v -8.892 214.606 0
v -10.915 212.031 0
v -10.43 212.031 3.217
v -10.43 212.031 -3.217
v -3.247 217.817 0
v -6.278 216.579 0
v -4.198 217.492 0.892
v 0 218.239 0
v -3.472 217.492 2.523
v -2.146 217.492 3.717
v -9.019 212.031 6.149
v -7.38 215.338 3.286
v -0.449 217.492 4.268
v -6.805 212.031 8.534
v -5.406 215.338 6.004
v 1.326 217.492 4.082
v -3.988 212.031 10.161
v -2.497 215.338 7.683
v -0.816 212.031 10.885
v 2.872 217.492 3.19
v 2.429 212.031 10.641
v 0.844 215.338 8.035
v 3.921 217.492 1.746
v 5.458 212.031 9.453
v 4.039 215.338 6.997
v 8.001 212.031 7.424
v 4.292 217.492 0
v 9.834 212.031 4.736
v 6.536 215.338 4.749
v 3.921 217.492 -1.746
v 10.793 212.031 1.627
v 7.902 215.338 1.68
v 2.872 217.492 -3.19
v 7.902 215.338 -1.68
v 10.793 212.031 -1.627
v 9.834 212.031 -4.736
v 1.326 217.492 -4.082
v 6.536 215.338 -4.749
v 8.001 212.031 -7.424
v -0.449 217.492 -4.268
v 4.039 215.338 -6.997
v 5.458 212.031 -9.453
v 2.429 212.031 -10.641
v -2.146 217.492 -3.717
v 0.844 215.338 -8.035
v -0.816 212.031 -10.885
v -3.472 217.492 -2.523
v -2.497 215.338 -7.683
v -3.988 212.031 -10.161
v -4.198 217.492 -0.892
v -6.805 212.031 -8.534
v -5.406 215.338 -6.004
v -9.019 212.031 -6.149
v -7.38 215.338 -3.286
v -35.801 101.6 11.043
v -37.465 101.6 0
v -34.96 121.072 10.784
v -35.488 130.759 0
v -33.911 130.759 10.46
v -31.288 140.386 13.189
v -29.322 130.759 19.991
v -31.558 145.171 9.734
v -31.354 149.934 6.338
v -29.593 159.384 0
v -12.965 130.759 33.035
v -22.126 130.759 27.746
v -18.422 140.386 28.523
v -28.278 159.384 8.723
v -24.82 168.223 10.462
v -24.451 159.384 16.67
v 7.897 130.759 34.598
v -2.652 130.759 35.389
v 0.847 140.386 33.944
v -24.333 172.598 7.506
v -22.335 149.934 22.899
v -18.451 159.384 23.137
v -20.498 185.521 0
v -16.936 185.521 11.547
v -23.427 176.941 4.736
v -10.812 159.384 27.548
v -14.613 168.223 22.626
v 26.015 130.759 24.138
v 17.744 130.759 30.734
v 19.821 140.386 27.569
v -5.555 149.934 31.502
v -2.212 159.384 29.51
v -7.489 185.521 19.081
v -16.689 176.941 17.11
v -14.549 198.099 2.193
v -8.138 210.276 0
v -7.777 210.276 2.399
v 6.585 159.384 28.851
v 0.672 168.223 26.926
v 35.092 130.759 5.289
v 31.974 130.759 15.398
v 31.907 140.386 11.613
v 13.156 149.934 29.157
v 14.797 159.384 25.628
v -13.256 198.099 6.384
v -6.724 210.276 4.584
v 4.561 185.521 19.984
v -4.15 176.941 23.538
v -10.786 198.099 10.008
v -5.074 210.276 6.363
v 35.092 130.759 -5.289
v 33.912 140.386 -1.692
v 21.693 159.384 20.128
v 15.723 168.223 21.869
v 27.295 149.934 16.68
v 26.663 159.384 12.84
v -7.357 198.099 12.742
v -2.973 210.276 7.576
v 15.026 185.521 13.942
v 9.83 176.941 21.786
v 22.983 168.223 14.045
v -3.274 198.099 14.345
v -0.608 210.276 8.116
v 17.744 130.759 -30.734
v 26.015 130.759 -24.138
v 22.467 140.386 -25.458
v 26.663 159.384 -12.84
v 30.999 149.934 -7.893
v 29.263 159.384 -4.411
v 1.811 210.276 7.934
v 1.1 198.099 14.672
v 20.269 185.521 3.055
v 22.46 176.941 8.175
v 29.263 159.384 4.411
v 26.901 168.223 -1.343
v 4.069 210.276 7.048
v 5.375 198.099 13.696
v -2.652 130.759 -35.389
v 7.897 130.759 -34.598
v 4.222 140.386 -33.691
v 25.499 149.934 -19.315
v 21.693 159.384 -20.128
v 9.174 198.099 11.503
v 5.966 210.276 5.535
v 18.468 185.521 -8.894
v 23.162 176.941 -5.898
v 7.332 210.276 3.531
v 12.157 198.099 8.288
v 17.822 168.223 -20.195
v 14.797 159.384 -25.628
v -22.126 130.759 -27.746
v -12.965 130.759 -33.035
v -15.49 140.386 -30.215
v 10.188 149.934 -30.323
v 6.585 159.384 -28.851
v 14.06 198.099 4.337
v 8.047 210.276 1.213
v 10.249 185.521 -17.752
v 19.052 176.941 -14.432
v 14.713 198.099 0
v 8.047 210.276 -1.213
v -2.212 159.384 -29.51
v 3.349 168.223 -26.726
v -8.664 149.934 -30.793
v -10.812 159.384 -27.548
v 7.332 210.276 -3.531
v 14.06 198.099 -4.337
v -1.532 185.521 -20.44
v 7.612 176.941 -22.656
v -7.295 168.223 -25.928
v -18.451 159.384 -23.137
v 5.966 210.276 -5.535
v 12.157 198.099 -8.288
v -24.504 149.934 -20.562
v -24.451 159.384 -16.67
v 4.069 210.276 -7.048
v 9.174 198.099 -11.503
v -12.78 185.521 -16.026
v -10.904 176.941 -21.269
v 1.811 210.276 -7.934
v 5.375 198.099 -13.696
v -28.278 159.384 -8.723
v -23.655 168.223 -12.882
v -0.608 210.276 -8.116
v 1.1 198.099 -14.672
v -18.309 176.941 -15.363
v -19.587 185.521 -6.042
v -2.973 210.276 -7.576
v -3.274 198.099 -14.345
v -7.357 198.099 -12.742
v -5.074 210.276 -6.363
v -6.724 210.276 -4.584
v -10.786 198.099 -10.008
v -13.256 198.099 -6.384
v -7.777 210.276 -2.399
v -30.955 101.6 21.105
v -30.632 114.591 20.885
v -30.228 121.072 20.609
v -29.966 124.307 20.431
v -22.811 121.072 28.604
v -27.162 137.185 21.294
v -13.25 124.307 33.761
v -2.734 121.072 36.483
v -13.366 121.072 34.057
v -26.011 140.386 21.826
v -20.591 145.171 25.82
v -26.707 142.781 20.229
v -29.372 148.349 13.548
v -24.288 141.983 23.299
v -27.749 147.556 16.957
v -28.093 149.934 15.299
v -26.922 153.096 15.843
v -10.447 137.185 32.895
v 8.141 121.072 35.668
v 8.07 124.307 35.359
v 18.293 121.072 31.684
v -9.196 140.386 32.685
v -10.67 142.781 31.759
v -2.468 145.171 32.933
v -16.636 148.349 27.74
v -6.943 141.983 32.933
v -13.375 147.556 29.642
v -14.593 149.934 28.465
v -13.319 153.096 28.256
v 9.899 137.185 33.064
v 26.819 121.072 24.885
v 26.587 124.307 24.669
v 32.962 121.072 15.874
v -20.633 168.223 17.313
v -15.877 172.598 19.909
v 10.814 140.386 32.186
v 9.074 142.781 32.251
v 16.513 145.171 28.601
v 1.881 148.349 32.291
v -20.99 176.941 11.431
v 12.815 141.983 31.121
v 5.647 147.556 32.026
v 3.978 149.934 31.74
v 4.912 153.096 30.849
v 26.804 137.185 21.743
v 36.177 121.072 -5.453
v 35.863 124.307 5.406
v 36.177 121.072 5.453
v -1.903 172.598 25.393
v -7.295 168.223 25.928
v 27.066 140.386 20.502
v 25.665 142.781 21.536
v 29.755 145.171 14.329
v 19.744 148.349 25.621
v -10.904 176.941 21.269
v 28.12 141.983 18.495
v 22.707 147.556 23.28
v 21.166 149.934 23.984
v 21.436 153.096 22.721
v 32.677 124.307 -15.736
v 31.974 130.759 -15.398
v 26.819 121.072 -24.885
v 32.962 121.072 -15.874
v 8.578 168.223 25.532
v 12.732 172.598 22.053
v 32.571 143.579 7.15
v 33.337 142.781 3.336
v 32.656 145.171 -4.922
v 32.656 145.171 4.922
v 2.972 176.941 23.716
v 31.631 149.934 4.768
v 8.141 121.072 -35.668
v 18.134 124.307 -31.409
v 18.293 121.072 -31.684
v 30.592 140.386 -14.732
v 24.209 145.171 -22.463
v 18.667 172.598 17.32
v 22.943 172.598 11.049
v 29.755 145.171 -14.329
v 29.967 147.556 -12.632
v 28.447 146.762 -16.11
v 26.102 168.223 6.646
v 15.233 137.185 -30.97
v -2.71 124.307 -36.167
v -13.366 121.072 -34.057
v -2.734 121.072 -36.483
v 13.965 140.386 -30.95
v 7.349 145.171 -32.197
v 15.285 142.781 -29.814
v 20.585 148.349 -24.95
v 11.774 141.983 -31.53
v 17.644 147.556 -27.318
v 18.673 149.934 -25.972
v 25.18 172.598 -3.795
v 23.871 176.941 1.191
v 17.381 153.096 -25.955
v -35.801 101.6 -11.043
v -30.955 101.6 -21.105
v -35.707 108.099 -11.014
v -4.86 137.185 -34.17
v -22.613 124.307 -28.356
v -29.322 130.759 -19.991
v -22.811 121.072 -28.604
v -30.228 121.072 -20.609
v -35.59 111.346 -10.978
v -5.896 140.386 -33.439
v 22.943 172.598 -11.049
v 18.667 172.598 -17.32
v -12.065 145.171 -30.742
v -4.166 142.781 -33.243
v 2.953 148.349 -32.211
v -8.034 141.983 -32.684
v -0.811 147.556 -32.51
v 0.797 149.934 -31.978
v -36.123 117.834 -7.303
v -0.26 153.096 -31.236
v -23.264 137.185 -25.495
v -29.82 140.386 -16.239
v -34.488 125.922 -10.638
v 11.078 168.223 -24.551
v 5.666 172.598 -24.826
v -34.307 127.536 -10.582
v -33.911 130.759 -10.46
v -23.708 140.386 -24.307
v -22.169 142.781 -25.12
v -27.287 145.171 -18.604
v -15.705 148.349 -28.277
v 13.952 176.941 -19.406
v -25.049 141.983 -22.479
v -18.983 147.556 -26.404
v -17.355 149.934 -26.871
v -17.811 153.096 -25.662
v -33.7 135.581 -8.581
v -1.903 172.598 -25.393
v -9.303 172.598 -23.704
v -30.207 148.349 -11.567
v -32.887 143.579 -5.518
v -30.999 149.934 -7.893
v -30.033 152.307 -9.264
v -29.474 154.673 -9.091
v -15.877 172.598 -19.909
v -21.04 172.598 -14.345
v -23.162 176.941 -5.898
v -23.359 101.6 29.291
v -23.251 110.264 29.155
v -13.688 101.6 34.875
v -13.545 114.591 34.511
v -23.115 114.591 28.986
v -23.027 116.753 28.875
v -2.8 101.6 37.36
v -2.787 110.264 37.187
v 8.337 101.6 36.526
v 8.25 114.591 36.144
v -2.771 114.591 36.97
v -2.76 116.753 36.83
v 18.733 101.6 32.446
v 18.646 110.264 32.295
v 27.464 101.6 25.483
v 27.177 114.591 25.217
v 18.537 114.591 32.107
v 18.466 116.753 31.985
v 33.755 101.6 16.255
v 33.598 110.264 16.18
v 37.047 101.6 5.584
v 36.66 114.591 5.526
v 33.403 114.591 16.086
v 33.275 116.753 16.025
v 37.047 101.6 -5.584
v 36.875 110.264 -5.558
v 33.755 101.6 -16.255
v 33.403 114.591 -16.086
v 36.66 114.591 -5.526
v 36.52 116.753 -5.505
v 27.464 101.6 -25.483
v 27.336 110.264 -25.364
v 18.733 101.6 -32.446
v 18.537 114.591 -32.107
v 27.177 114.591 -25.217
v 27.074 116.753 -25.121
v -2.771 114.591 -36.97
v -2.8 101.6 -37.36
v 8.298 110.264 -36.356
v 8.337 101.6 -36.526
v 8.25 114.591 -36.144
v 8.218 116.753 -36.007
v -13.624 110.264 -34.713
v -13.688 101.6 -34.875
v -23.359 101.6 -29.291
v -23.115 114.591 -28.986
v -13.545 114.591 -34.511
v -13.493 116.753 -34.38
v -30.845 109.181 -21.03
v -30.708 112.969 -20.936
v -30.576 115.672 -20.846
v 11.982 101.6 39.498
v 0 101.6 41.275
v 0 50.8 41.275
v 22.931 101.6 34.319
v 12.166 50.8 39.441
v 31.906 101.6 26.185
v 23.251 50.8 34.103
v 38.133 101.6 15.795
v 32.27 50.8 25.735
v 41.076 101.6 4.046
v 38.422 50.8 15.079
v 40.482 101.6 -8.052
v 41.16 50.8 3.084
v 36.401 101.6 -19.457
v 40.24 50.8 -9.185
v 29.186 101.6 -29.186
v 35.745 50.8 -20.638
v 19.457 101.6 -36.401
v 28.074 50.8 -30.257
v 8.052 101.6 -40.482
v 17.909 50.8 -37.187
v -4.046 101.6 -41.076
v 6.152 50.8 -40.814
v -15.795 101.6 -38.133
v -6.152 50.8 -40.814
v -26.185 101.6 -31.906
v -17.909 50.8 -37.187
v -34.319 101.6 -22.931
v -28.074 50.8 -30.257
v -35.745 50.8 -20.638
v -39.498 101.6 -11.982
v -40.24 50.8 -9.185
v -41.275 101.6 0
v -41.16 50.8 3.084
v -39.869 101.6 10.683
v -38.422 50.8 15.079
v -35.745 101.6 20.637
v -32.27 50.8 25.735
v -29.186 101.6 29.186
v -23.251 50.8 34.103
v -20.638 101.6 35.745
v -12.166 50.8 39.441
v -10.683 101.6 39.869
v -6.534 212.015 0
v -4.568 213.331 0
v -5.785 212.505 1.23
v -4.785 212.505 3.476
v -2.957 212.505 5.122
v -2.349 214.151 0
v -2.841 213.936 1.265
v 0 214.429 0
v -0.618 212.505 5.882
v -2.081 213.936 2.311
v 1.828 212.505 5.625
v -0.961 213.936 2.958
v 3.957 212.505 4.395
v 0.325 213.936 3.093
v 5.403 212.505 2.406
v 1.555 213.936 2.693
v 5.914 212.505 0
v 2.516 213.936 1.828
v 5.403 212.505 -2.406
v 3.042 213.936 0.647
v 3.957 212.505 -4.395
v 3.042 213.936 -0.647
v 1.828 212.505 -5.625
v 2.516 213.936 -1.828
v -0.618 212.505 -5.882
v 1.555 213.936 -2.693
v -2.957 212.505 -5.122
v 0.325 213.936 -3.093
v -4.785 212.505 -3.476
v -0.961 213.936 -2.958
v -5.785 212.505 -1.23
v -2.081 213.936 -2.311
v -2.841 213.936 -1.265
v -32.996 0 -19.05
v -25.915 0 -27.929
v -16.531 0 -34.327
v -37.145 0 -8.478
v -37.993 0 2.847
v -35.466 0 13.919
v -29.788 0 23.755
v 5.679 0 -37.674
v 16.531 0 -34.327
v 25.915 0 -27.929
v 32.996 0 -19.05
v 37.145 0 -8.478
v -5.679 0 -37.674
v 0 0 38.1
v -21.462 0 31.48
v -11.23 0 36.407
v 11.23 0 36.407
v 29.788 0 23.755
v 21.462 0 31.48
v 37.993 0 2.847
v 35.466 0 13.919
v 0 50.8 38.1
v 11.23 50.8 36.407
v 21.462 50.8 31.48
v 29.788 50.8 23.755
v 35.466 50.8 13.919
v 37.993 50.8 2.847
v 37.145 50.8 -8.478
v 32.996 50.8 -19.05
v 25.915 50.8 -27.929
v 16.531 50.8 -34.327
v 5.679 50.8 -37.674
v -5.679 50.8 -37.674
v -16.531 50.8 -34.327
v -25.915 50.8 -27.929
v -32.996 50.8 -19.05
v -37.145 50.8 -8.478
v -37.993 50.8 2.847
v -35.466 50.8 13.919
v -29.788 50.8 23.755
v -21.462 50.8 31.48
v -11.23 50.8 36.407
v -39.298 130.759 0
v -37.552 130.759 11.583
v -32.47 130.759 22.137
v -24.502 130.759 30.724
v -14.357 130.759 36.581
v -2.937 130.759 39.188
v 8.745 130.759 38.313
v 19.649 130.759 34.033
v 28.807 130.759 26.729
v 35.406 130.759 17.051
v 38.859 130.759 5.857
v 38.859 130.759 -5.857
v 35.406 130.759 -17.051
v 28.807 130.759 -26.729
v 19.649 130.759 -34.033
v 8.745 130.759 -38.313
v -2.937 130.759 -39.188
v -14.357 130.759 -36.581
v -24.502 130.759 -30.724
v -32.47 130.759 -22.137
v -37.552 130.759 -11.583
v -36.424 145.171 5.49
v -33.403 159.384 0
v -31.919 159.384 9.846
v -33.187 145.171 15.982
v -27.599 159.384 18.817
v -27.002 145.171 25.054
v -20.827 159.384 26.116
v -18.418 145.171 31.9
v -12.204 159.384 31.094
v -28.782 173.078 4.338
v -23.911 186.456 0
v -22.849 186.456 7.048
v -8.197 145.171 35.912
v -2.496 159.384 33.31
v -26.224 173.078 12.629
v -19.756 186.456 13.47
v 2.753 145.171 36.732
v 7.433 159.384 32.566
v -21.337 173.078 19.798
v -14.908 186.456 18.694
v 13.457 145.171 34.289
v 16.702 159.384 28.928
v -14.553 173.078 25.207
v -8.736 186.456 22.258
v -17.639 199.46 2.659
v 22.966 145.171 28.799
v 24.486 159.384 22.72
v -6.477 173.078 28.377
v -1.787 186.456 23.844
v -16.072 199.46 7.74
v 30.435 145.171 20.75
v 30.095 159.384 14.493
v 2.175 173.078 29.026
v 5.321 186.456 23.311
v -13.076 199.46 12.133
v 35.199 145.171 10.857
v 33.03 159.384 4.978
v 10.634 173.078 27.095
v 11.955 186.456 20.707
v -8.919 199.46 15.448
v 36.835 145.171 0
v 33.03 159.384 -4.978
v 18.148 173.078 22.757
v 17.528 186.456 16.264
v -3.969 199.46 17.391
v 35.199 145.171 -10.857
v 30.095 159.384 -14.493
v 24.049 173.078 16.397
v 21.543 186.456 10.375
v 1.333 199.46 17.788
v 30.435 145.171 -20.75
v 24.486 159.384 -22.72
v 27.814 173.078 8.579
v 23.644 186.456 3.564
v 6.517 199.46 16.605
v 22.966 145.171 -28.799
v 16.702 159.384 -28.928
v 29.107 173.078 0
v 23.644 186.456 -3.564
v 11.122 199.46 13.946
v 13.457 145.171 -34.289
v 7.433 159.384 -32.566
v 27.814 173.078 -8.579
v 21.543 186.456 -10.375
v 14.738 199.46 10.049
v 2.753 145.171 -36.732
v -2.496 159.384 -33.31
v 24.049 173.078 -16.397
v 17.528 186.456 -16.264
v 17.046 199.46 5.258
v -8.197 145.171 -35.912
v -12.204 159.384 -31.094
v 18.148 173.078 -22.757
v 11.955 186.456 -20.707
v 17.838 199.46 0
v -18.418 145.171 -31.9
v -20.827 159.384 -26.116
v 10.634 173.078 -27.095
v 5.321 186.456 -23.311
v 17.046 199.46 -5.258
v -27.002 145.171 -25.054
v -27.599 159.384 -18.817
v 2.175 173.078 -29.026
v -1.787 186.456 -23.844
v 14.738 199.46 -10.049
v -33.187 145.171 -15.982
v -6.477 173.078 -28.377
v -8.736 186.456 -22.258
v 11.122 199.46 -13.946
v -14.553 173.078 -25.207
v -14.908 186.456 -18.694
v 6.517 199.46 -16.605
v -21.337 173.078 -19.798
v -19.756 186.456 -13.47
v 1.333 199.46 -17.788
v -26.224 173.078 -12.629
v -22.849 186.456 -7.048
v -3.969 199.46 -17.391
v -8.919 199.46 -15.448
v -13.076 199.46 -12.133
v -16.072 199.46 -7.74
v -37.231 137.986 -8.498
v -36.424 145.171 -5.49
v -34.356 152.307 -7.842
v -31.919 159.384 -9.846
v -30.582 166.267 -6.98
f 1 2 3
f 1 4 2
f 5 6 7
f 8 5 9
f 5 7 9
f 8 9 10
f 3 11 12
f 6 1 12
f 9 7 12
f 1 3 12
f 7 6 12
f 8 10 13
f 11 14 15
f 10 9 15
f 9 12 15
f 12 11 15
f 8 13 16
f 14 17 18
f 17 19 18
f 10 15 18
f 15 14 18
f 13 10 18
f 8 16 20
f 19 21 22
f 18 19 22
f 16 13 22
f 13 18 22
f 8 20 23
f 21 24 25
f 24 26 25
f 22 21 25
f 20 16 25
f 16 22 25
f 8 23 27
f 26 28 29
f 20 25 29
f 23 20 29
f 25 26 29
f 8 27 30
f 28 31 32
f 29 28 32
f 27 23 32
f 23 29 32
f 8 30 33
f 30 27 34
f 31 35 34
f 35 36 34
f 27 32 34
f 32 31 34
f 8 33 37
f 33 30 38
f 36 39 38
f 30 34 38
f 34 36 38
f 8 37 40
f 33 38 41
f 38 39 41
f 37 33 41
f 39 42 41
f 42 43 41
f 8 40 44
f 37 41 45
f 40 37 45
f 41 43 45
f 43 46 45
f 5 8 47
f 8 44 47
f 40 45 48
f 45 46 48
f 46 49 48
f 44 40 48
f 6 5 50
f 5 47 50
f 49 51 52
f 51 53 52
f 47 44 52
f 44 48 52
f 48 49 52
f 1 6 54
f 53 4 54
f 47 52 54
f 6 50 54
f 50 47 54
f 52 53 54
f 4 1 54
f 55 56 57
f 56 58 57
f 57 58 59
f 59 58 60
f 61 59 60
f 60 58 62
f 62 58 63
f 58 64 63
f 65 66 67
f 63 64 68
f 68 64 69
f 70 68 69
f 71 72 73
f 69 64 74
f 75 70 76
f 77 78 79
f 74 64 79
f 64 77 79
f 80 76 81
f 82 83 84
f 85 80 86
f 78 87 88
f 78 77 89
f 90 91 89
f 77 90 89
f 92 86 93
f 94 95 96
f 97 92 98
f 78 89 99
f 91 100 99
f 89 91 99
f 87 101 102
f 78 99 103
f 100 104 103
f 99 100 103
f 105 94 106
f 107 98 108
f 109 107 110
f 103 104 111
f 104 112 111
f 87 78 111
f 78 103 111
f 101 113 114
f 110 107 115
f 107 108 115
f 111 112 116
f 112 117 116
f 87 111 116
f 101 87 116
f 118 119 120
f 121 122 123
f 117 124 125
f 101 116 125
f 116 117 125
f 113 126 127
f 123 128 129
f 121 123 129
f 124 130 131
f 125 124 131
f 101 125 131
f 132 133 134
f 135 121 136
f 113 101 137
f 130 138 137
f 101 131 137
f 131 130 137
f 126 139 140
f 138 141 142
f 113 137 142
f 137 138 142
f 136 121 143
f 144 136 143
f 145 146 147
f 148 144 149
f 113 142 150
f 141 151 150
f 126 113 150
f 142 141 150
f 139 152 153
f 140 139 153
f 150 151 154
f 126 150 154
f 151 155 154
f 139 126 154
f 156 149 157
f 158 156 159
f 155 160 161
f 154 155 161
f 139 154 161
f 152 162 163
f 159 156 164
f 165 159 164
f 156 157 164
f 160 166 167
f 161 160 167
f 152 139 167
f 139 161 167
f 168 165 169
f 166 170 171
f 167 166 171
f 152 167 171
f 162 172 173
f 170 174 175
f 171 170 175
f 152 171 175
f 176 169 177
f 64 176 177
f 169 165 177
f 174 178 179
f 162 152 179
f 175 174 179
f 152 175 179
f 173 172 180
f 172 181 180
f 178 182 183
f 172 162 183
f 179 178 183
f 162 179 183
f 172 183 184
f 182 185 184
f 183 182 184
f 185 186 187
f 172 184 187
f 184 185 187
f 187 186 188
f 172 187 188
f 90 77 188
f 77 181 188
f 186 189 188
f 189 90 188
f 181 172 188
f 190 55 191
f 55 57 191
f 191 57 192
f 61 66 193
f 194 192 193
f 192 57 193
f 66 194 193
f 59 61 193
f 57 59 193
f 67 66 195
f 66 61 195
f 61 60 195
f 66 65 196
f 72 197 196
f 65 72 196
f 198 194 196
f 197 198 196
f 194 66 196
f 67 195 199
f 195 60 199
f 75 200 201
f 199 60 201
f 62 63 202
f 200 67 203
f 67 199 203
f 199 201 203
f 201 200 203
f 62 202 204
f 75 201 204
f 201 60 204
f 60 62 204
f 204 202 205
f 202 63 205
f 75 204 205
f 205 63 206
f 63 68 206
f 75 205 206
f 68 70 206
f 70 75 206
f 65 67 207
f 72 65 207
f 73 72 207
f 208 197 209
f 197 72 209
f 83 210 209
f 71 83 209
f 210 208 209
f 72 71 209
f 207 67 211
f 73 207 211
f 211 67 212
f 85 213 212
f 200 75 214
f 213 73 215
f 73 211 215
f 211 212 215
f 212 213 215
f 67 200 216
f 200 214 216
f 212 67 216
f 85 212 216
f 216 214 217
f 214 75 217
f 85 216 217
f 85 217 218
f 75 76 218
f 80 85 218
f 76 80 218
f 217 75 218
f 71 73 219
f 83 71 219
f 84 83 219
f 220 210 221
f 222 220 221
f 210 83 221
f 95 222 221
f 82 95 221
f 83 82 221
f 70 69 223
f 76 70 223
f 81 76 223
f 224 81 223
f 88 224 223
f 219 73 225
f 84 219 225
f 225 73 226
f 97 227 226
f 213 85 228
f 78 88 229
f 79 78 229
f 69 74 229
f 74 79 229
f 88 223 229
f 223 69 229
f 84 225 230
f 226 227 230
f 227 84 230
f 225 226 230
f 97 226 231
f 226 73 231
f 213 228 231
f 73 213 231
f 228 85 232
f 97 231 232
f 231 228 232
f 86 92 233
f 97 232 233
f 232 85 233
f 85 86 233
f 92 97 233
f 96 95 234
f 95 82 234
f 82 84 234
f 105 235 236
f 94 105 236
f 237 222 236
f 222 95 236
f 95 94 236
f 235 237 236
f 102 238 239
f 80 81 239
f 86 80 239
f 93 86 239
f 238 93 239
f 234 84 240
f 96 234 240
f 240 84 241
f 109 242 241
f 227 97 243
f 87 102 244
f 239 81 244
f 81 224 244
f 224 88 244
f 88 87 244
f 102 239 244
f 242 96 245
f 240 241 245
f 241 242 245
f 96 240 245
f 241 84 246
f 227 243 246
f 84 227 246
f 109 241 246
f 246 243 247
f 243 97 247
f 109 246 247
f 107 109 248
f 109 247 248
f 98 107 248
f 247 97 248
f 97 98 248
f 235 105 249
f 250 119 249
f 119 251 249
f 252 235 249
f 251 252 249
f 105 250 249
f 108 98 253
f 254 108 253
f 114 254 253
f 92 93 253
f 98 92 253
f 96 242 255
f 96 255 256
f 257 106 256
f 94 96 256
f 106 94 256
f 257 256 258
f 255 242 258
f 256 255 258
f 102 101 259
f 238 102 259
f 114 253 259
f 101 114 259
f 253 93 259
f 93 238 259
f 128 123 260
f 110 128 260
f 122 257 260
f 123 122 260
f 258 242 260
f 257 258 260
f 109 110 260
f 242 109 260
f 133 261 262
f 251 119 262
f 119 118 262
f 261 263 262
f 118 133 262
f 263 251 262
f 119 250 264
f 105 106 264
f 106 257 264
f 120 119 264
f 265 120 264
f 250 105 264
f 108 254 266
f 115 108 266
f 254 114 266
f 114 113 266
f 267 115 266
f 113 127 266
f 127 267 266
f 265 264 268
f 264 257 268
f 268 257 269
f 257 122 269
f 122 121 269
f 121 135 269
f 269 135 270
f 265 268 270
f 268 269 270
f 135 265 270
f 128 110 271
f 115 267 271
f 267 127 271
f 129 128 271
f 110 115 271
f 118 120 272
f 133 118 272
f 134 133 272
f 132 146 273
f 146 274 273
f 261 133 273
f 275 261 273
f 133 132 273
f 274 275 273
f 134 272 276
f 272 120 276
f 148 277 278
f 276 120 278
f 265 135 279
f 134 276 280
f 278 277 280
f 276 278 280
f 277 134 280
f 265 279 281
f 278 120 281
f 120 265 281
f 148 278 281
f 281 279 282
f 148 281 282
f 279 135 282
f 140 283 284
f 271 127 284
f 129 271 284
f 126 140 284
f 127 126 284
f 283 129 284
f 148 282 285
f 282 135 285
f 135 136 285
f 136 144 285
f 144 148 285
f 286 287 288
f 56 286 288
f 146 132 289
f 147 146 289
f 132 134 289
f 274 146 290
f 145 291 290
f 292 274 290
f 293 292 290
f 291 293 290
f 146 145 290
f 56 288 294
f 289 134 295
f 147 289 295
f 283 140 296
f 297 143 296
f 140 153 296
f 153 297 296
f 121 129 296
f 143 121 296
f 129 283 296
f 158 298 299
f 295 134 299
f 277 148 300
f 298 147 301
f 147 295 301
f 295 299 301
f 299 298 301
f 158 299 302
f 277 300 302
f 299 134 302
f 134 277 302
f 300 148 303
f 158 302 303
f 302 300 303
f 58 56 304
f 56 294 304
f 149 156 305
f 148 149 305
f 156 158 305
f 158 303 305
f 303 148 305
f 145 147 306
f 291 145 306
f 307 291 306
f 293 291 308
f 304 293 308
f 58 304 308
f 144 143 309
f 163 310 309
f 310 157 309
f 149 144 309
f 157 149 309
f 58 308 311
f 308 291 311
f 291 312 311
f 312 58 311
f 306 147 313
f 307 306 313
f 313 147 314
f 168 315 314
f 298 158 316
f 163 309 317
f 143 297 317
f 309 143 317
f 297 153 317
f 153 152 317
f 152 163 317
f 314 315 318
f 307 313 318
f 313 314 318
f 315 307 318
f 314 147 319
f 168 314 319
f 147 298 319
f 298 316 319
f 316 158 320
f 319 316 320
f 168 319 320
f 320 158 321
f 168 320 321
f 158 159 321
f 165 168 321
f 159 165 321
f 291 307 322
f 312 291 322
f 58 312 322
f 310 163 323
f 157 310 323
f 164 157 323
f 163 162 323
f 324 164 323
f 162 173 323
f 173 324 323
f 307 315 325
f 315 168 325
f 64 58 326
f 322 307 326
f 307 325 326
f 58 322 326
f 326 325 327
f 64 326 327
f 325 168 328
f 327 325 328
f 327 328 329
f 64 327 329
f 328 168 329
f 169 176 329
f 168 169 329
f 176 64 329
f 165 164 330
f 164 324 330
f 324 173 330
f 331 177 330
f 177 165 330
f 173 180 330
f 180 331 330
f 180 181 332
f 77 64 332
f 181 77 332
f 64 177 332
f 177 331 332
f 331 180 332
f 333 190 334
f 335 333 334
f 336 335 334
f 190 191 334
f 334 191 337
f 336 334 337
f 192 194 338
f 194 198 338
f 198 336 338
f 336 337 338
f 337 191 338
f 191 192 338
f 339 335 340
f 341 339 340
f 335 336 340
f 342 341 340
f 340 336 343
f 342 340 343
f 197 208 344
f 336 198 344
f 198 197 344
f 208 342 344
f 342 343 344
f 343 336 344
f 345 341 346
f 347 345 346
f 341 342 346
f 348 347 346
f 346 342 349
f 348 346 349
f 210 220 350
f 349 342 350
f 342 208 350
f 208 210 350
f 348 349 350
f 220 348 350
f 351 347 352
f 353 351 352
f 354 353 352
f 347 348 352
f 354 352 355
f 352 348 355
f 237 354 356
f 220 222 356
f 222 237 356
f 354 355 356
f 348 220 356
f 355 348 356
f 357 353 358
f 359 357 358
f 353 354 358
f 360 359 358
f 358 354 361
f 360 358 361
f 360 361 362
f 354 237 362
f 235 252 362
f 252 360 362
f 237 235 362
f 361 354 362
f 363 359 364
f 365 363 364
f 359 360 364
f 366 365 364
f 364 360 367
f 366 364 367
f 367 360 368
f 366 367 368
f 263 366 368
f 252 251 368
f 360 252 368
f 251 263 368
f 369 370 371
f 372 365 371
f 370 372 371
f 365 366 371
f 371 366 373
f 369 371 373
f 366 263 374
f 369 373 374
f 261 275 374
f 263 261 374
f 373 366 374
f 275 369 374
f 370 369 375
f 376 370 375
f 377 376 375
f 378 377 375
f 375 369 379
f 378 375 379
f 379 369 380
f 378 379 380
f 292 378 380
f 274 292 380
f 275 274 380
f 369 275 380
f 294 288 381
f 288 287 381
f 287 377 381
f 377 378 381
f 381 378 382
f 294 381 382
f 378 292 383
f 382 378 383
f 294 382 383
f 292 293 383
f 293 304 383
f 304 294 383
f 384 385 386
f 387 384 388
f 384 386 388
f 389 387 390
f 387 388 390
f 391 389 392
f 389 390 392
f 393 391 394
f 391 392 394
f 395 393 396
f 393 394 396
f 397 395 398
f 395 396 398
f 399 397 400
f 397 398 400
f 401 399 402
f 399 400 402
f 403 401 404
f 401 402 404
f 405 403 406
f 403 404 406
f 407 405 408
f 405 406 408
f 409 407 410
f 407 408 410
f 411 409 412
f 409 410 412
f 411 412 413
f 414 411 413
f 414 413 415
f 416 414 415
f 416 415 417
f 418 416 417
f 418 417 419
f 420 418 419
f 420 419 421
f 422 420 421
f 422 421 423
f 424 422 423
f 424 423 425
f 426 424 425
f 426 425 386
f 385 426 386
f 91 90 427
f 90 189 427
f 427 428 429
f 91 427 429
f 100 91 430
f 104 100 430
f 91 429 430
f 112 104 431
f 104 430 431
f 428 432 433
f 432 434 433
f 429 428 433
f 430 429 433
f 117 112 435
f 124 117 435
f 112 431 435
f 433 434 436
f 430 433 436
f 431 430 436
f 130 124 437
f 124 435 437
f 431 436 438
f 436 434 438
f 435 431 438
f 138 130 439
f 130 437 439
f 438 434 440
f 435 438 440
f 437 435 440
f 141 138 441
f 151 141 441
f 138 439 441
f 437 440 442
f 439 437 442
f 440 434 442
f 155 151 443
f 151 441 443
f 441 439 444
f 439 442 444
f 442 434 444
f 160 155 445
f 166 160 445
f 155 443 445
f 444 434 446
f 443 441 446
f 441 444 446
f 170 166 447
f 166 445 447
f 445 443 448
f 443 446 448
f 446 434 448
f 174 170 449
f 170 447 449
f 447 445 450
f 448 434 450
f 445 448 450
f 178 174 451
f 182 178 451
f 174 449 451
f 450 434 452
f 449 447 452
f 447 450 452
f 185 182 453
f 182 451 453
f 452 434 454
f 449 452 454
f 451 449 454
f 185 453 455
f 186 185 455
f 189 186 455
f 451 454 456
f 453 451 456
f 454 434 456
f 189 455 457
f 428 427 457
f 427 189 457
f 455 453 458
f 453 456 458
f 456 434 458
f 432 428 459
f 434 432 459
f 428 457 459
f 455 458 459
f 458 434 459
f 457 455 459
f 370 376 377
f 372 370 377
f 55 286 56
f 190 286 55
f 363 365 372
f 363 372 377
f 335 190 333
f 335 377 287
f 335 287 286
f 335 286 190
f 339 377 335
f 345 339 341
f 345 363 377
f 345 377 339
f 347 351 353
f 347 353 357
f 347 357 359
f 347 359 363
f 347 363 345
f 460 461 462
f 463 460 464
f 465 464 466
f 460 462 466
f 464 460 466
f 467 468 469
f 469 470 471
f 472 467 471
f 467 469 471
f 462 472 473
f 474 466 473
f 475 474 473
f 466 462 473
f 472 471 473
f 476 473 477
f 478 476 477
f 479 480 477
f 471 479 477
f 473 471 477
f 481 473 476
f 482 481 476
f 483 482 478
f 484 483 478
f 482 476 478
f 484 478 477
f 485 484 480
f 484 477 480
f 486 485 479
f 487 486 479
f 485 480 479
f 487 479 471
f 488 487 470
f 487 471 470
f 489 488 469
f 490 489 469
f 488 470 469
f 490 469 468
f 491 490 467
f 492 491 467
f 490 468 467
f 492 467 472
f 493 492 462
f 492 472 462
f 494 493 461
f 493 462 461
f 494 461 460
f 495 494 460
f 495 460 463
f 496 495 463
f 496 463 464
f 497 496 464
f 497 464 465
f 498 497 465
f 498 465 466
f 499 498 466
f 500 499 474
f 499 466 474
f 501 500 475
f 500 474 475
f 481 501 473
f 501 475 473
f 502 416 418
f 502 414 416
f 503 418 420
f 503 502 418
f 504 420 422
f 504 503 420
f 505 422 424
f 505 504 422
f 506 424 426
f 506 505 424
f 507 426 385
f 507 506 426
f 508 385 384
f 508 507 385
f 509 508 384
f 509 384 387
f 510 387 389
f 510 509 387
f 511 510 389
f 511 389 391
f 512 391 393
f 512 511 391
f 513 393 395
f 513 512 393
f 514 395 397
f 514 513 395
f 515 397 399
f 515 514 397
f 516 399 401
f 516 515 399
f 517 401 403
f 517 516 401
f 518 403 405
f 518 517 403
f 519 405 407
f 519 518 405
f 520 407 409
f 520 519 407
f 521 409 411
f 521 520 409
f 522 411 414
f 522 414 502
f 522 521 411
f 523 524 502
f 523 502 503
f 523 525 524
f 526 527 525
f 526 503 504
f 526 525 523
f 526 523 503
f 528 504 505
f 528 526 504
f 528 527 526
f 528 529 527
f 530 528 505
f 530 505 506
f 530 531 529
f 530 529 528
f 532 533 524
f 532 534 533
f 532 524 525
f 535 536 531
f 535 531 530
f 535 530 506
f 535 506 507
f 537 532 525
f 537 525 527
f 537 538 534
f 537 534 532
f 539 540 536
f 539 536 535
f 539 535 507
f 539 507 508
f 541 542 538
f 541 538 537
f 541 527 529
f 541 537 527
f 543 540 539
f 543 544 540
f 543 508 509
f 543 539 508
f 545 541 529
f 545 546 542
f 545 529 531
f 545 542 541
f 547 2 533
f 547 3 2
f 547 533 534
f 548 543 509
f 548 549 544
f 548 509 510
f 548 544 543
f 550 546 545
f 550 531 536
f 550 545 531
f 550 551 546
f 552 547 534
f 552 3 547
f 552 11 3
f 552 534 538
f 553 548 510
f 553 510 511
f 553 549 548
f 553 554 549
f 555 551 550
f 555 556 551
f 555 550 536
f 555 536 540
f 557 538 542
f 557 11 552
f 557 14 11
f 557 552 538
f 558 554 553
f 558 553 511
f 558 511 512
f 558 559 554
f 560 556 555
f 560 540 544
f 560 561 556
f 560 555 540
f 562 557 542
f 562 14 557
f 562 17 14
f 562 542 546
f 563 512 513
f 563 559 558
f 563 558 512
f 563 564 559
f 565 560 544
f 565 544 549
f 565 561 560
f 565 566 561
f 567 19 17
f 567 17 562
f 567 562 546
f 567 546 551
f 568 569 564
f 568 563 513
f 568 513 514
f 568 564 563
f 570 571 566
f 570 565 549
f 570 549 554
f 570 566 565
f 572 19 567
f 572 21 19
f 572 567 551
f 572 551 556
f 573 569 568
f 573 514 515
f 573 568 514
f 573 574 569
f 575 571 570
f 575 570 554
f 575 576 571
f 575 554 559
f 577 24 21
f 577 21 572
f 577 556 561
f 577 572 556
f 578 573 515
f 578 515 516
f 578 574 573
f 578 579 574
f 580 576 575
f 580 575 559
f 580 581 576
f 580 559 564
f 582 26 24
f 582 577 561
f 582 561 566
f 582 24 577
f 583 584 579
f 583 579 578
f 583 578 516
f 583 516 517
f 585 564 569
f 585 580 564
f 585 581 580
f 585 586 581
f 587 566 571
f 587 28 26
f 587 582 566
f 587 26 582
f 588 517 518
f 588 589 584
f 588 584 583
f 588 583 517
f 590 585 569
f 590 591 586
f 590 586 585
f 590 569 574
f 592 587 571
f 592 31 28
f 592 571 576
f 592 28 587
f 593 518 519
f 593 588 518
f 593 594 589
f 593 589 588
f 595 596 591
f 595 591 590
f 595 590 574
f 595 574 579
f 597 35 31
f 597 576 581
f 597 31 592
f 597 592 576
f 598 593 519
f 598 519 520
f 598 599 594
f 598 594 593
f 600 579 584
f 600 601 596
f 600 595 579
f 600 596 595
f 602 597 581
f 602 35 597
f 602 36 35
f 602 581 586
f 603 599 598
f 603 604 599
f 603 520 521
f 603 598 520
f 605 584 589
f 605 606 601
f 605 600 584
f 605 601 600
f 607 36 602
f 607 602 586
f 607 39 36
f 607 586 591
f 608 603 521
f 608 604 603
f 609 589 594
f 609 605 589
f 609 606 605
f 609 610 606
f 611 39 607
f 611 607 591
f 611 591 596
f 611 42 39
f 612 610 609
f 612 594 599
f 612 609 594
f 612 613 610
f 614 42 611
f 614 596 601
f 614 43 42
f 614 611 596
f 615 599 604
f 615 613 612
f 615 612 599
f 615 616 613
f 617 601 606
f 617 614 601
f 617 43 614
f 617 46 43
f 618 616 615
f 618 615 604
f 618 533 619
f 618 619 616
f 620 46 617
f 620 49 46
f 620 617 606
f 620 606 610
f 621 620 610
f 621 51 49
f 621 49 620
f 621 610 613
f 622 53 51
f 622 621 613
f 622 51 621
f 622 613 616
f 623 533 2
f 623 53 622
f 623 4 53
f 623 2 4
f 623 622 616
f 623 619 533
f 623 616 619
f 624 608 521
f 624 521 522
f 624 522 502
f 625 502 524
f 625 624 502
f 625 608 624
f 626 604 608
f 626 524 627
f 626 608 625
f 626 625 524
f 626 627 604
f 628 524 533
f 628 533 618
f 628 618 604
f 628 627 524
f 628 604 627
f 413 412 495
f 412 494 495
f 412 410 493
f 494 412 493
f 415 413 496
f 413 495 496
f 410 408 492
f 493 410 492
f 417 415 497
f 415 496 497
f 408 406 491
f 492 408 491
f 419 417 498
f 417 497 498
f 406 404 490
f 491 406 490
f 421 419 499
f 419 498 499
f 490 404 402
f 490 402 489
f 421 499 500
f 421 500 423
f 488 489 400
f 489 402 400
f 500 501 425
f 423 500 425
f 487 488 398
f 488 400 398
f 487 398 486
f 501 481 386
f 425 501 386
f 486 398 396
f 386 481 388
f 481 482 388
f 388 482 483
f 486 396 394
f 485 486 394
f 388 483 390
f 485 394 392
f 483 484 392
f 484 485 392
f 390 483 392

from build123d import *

# Parameters (mm, degrees)
SKETCH1_R           = 38.1
BOSS_EXTRUDE1_DEPTH = 50.8
SKETCH2_R           = 41.275
BOSS_EXTRUDE2_DEPTH = 50.8


with BuildPart() as part:
    # Sketch1 → Boss-Extrude1 (new body)
    with BuildSketch(Plane(origin=(0, 0, 0), x_dir=(1, 0, 0), z_dir=(0, 1, 0))):
        with Locations(Location((0, 0, 0), (0, 0, 270))):
            Circle(SKETCH1_R)
    extrude(amount=BOSS_EXTRUDE1_DEPTH)

    # Sketch2 → Boss-Extrude2 (add)
    with BuildSketch(Plane(origin=(0, 50.8, 0), x_dir=(1, 0, 0), z_dir=(0, 1, 0))):
        with Locations(Location((0, 0, 0), (0, 0, 270))):
            Circle(SKETCH2_R)
    extrude(amount=BOSS_EXTRUDE2_DEPTH)

    # Sketch3 → Revolve17 (revolve)
    with BuildSketch(Plane.XY):
        with BuildLine():
            Line((0, 214.429060371), (0, 218.239060371))
            ThreePointArc((0, 218.239060371), (-6.278456146, 216.578582298), (-10.915144585, 212.031350247))
            add(Edge.make_bspline(
                [(-41.275, 101.6), (-41.275, 101.930502855), (-41.273557103, 102.40564964), (-41.268747446, 103.512092248), (-41.257925909, 104.319246857), (-41.246383117, 105.163883335), (-41.228347866, 106.135820012), (-41.200734551, 107.334179726), (-41.159757311, 108.729726347), (-41.100846347, 110.335373987), (-41.029571588, 111.946697142), (-40.946255064, 113.558844584), (-40.850901423, 115.169512919), (-40.743515987, 116.779892998), (-40.624104745, 118.389166096), (-40.459816828, 120.399743968), (-40.238647793, 122.810299788), (-39.945617875, 125.619277994), (-39.562802148, 128.824148418), (-38.809156369, 134.422061303), (-36.96766496, 145.570323281), (-33.49128341, 160.52369707), (-28.30812049, 176.263796505), (-22.487129194, 190.02095936), (-18.428836954, 198.367582764), (-16.193226279, 202.662272388), (-14.657371604, 205.491195217), (-13.781700582, 207.066687496), (-13.19565908, 208.105983946), (-12.707159013, 208.962552916), (-12.311115433, 209.650979413), (-11.92041177, 210.324783551), (-11.526473808, 210.998380475), (-11.168679866, 211.6041541), (-10.999621727, 211.88932335), (-10.915144585, 212.031350247)],
                knots=[0.08301761, 0.08301761, 0.08301761, 0.08301761, 0.08301761, 0.094422695, 0.100125237, 0.105827779, 0.111530322, 0.117232864, 0.128637949, 0.140293389, 0.15194883, 0.163604271, 0.175259711, 0.186915153, 0.198570596, 0.210226038, 0.22188148, 0.245192344, 0.268503208, 0.291814091, 0.315124974, 0.408368487, 0.594855494, 0.734720752, 0.792997941, 0.839619695, 0.862930572, 0.87458601, 0.885991093, 0.891693634, 0.897396175, 0.903098717, 0.908801258, 0.914503799, 0.920206341, 0.920206341, 0.920206341, 0.920206341, 0.920206341], degree=4))
            Line((-41.275, 101.6), (-37.465, 101.6))
            add(Edge.make_bspline(
                [(-37.465, 101.6), (-37.465, 101.930502867), (-37.463557103, 102.405649652), (-37.458747445, 103.51209226), (-37.447925909, 104.31924687), (-37.436383117, 105.163883348), (-37.418347866, 106.135820025), (-37.39073455, 107.334179738), (-37.349757311, 108.729726359), (-37.290846347, 110.335373999), (-37.219571587, 111.946697154), (-37.136255063, 113.558844596), (-37.040901422, 115.169512931), (-36.933515986, 116.779893011), (-36.814104744, 118.389166108), (-36.649816827, 120.39974398), (-36.428647791, 122.8102998), (-36.135617873, 125.619278007), (-35.752802146, 128.82414843), (-34.999156367, 134.422061315), (-33.157664958, 145.570323293), (-29.681283406, 160.523697081), (-24.498120486, 176.263796517), (-18.677129189, 190.020959371), (-14.618836949, 198.367582775), (-12.383226273, 202.662272399), (-10.847371598, 205.491195228), (-9.971700576, 207.066687506), (-9.385659074, 208.105983957), (-8.897159007, 208.962552926), (-8.557849604, 209.552360704), (-8.32017223, 209.962884372), (-8.180293781, 210.203522785), (-8.13830032, 210.275674617)],
                knots=[0.08301761, 0.08301761, 0.08301761, 0.08301761, 0.08301761, 0.094422695, 0.100125237, 0.105827779, 0.111530322, 0.117232864, 0.128637949, 0.140293389, 0.15194883, 0.163604271, 0.175259711, 0.186915153, 0.198570596, 0.210226038, 0.22188148, 0.245192344, 0.268503208, 0.291814091, 0.315124974, 0.408368487, 0.594855494, 0.734720752, 0.792997941, 0.839619695, 0.862930572, 0.87458601, 0.885991093, 0.891693634, 0.897396175, 0.903098717, 0.905533648, 0.905533648, 0.905533648, 0.905533648, 0.905533648], degree=4))
            ThreePointArc((-8.13830032, 210.275674617), (-4.568439157, 213.330693141), (0, 214.429060371))
        make_face()
    revolve(axis=Axis((0, 0, 0), (0, 1, 0)))


solid = part.part
